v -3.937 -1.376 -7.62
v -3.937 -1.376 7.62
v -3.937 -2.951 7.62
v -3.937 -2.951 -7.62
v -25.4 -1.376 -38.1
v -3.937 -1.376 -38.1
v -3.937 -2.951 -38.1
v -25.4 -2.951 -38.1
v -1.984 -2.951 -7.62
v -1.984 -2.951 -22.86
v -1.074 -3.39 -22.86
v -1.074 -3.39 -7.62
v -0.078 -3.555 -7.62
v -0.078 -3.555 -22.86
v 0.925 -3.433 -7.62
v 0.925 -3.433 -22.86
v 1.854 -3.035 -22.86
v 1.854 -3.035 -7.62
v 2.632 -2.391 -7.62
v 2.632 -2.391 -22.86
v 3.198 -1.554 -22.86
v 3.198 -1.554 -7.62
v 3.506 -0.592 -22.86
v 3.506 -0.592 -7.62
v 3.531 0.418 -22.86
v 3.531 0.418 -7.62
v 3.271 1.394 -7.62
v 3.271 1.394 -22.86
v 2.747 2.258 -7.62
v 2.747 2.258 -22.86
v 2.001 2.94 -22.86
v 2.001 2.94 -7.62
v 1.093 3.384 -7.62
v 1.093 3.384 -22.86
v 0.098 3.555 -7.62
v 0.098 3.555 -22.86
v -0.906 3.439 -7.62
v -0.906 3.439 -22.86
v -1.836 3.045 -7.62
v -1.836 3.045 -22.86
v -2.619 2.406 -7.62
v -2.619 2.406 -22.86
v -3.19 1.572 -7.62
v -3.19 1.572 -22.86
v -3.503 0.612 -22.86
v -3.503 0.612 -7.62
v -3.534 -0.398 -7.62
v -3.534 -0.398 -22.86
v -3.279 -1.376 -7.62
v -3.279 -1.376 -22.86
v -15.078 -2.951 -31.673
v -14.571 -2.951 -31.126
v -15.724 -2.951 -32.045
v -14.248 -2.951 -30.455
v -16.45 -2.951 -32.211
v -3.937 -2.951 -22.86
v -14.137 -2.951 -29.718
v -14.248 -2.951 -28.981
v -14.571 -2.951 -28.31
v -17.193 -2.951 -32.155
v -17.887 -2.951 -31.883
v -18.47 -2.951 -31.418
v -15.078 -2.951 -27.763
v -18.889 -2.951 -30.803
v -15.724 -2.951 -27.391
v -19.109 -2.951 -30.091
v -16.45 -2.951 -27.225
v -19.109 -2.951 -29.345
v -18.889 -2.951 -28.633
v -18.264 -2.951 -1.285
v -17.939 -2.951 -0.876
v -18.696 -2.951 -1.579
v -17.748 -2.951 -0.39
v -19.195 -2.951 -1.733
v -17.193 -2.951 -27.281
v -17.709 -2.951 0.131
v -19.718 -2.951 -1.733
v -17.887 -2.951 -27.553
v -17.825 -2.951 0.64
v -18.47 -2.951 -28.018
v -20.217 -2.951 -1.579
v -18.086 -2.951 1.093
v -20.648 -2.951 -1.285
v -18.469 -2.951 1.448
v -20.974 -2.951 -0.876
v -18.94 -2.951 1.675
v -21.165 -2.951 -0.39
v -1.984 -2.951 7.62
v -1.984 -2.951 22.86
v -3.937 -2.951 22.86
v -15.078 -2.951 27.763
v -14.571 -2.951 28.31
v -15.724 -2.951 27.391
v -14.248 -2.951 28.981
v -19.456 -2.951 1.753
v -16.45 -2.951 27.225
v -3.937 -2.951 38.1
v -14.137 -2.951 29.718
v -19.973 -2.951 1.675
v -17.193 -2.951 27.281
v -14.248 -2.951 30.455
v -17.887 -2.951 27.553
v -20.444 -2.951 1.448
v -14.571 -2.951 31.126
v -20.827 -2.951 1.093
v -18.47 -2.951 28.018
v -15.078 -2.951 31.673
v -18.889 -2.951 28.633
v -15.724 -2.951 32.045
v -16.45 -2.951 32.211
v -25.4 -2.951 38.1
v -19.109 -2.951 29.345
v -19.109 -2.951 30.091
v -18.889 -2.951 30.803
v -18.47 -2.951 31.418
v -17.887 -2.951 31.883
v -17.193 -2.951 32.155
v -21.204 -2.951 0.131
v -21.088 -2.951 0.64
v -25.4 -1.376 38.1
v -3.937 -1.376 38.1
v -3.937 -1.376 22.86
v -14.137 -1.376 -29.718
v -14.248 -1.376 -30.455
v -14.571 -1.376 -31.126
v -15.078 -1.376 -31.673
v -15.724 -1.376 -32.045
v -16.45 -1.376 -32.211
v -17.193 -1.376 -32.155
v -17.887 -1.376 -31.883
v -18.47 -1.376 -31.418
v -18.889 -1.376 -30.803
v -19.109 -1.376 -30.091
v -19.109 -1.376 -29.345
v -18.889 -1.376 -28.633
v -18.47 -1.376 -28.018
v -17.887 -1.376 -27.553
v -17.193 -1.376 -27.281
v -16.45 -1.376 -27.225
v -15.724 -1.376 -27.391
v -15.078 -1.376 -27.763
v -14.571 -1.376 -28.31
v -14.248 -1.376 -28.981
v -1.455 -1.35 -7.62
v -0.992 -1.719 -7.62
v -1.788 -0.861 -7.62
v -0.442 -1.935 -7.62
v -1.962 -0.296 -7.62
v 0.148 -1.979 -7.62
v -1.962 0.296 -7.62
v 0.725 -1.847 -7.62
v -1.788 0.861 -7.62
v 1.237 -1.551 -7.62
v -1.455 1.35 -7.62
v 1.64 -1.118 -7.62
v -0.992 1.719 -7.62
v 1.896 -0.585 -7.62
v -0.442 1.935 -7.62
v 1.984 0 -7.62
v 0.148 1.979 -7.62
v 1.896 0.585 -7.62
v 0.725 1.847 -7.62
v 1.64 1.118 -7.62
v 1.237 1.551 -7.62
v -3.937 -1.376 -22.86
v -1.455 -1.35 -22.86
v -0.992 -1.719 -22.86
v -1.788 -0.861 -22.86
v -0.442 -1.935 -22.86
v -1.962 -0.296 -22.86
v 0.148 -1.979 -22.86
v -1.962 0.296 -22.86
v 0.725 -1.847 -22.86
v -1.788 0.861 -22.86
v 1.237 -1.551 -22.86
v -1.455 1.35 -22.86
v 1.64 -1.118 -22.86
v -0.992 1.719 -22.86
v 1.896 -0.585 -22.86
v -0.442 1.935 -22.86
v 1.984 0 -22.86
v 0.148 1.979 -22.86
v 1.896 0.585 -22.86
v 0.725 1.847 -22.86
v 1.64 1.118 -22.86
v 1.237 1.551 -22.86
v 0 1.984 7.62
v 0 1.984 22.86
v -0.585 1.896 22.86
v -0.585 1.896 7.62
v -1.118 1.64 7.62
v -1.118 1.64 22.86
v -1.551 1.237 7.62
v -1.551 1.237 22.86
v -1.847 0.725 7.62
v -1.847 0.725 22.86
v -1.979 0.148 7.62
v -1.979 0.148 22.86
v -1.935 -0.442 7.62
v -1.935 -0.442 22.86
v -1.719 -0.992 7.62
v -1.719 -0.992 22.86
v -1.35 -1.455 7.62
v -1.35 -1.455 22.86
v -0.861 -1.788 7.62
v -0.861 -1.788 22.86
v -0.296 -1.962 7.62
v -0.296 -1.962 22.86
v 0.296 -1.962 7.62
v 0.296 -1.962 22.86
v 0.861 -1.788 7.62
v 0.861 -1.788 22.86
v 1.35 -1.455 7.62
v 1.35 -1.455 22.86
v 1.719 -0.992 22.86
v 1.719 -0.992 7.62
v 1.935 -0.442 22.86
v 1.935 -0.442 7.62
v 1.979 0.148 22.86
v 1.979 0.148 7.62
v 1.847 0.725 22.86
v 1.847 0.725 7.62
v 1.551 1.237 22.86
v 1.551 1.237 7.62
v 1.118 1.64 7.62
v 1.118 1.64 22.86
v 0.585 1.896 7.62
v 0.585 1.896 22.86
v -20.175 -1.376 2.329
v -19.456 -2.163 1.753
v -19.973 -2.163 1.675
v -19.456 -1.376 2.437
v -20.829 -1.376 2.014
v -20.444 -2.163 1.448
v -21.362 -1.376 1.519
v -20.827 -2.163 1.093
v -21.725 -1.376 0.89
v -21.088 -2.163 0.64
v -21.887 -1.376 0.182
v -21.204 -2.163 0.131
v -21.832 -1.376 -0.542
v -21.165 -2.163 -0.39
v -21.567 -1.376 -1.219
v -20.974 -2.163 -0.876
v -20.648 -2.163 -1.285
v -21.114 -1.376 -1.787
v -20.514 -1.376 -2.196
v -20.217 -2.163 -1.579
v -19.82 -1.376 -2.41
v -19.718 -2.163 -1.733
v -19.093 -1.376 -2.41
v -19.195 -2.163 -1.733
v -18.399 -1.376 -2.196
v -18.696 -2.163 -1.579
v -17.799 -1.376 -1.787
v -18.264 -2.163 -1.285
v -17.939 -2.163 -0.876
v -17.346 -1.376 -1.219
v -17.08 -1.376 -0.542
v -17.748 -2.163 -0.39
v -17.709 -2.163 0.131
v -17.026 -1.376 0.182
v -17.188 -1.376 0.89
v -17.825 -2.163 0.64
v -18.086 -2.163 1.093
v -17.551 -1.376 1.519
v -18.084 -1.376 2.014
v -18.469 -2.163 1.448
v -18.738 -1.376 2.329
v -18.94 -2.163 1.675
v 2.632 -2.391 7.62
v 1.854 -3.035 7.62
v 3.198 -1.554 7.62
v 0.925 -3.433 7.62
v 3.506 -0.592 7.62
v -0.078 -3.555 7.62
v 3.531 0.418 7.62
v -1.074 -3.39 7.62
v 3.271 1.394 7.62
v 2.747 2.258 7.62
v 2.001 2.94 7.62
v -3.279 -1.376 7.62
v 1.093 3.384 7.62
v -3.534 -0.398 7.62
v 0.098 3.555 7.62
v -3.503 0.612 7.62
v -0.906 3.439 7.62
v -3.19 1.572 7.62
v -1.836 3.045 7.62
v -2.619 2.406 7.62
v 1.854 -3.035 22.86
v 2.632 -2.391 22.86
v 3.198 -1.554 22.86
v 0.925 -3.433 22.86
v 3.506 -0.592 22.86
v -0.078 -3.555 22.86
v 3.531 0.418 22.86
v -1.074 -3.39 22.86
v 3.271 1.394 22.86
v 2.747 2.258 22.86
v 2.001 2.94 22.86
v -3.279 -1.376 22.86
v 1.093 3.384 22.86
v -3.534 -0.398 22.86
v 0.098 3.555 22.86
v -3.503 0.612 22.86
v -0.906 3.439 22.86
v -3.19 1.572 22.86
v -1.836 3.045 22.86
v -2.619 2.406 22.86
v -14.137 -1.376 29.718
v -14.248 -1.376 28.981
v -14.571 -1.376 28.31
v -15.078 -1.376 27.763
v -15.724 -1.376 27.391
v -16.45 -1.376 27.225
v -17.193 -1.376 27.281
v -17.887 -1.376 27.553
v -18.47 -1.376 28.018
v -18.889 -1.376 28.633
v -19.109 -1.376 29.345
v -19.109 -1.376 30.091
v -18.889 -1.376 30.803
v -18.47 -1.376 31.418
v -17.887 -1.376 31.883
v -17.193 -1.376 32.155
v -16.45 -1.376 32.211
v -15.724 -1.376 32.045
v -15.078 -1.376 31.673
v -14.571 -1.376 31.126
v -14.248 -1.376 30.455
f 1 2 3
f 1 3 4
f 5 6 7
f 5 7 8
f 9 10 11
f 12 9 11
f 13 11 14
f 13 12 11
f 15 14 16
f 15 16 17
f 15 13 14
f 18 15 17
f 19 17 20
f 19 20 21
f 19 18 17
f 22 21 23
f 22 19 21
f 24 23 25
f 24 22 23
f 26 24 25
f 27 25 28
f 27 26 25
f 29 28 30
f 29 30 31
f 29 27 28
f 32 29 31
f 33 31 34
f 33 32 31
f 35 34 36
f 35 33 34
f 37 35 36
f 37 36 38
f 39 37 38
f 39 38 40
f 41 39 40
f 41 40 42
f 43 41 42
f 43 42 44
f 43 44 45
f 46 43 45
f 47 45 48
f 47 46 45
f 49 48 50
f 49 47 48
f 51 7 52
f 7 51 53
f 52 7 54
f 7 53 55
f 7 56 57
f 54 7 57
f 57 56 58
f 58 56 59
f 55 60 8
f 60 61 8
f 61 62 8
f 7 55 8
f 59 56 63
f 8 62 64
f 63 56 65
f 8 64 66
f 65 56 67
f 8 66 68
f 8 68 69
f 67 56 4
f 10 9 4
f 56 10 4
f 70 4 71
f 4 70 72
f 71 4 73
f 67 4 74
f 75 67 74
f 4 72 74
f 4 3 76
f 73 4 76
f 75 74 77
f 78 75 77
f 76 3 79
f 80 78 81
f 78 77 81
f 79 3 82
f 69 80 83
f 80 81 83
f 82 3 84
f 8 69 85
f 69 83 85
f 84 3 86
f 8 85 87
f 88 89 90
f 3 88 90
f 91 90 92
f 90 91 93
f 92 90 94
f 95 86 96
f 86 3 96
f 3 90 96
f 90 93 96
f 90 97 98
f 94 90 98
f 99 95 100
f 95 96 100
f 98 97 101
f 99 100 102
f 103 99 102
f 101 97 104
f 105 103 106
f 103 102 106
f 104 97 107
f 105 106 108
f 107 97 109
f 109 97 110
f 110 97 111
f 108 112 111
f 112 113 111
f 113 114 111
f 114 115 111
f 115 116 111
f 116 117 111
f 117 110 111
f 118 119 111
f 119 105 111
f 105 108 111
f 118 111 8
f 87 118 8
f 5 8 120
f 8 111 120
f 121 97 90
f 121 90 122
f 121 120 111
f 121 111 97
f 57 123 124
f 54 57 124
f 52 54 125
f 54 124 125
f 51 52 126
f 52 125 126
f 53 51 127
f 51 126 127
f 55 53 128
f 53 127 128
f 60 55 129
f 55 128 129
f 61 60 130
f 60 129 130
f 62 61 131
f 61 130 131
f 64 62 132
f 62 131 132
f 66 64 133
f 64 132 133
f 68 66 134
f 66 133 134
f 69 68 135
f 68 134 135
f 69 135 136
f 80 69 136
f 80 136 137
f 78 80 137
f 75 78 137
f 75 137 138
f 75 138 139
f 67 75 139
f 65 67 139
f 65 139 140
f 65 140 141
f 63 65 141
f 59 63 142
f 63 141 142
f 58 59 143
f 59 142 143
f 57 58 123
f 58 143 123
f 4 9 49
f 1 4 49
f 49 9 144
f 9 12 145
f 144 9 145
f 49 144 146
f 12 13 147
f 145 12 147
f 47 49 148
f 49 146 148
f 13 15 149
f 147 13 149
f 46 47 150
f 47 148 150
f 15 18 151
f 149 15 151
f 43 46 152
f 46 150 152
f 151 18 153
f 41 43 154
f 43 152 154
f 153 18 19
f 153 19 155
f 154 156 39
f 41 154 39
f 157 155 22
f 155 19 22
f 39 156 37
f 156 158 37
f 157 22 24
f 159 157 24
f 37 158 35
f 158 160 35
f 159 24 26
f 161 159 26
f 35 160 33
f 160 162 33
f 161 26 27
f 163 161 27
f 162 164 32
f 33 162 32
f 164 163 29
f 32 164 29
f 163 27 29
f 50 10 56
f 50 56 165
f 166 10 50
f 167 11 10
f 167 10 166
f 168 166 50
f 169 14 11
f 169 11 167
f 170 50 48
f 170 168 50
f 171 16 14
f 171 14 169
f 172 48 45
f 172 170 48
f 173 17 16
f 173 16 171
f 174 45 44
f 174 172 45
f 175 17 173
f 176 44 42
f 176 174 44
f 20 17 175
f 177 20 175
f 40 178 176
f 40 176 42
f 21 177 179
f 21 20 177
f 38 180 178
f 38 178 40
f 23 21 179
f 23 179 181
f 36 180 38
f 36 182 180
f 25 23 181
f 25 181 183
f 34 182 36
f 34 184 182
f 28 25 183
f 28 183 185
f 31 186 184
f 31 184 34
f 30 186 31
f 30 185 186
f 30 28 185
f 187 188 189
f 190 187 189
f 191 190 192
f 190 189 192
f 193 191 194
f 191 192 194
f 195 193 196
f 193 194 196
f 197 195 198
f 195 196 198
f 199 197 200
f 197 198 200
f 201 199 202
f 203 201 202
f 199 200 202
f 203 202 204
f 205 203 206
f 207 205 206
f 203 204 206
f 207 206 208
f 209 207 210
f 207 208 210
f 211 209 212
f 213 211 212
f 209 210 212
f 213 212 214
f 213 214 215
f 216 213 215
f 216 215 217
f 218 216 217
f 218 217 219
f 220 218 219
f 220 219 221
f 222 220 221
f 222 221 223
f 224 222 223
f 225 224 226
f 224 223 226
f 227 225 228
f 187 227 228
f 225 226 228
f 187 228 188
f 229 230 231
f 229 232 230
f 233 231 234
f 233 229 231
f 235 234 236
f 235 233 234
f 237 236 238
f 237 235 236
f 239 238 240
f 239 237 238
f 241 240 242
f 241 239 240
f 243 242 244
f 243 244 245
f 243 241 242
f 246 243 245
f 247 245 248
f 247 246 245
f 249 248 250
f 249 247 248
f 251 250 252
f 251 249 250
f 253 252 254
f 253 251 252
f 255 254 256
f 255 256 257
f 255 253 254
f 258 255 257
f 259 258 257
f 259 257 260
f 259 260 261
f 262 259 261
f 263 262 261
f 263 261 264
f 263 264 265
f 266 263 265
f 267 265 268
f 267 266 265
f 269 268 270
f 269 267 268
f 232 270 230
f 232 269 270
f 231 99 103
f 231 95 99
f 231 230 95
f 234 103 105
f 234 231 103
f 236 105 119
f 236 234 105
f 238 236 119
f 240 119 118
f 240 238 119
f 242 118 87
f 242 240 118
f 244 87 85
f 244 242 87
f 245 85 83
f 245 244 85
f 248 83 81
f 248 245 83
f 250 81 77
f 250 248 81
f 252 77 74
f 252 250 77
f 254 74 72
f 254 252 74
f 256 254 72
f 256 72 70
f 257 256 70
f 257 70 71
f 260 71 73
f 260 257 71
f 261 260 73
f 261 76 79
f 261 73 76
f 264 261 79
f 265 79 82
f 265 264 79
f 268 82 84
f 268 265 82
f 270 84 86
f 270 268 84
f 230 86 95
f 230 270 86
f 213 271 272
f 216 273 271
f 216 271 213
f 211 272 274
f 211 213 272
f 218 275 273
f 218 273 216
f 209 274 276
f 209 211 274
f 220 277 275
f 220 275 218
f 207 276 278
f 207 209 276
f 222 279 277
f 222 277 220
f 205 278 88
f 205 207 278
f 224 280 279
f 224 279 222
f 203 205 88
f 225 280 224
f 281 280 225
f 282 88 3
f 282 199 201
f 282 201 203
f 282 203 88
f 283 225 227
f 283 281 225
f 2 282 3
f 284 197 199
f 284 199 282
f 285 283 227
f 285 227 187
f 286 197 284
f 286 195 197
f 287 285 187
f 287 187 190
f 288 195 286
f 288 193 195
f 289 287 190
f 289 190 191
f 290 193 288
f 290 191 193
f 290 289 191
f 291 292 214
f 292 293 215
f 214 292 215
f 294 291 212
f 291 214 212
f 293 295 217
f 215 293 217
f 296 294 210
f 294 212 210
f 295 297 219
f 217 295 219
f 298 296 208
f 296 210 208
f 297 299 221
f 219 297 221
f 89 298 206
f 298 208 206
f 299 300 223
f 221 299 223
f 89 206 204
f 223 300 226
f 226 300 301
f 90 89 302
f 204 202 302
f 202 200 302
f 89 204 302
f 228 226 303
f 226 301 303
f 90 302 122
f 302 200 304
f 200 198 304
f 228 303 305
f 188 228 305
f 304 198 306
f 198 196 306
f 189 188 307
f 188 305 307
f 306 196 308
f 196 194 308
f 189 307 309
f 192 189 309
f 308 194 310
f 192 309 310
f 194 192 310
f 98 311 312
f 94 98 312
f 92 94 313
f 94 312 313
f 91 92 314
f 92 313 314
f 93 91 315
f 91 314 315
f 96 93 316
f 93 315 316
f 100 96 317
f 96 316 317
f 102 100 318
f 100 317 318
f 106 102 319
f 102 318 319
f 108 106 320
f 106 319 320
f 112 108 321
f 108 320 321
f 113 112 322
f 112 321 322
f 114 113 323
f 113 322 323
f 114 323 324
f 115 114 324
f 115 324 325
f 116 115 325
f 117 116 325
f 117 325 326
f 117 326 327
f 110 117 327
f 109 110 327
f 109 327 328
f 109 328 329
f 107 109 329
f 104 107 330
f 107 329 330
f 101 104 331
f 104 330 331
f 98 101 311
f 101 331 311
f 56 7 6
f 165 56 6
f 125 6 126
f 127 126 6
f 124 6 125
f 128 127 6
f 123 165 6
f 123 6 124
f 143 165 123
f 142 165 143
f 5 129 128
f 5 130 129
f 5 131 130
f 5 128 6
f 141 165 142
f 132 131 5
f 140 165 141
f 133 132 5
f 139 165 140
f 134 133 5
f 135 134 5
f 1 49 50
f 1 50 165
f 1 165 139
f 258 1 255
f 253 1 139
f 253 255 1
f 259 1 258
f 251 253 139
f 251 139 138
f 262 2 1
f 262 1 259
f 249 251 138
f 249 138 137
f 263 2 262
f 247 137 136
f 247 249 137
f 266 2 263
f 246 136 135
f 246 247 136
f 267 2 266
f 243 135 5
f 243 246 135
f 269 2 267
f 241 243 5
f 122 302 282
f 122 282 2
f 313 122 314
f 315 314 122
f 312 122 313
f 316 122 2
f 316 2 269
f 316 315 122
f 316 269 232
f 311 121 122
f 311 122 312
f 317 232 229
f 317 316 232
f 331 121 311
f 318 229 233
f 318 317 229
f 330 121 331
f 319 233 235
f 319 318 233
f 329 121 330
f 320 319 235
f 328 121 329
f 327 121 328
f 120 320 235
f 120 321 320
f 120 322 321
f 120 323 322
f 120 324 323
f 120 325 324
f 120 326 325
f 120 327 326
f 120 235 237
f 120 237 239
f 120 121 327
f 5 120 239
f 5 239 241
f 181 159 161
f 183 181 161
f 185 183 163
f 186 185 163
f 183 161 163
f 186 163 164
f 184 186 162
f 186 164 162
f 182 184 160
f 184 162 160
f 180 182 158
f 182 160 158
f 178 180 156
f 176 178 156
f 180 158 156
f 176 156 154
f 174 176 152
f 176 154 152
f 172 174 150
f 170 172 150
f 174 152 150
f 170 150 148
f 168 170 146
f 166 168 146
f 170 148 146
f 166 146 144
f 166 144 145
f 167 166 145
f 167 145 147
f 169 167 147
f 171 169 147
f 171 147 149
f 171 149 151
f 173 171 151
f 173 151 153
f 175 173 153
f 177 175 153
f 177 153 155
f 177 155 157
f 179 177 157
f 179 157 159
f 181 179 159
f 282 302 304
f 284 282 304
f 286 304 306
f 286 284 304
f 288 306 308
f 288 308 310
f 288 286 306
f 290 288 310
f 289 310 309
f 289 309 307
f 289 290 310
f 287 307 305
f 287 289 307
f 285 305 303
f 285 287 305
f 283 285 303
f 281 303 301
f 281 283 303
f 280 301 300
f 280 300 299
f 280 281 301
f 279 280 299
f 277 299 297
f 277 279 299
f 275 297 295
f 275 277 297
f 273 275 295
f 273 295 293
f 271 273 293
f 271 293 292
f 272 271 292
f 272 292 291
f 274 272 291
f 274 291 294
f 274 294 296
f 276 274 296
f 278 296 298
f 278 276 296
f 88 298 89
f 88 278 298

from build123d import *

# Parameters (mm, degrees)
BOSS_EXTRUDE1_DEPTH                            = 15.24
SKETCH2_W                                      = 15.24
SKETCH2_H                                      = 1.5748
BOSS_EXTRUDE2_DEPTH                            = 0.254646985
SKETCH3_W                                      = 30.48
SKETCH3_H                                      = 1.5748
BOSS_EXTRUDE3_DEPTH                            = 21.866377542
SKETCH4_W                                      = 15.24
SKETCH4_H                                      = 1.5748
CUT_EXTRUDE1_DEPTH                             = 0.403377542
BOSS_EXTRUDE4_DEPTH                            = 15.24
SKETCH6_W                                      = 21.463
SKETCH6_H                                      = 1.5748
BOSS_EXTRUDE5_DEPTH                            = 15.24
SKETCH7_W                                      = 21.463
SKETCH7_H                                      = 1.5748
BOSS_EXTRUDE6_DEPTH                            = 15.24
SKETCH8_W                                      = 1.984375
SKETCH8_H                                      = 30.480025
M3_5_CLEARANCE_HOLE2_D                         = 3.96875
M3_5_CLEARANCE_HOLE2_DEPTH                     = 60.960025
CSK_FOR_M3_FLAT_HEAD_MACHINE_SCREW1_AT_2_COUNT = 2
CSK_FOR_M3_FLAT_HEAD_MACHINE_SCREW1_AT_2_PITCH = 59.436
CSK_FOR_M3_FLAT_HEAD_MACHINE_SCREW1_AT_3_COUNT = 2
CSK_FOR_M3_FLAT_HEAD_MACHINE_SCREW1_AT_3_PITCH = 29.851441177
SKETCH14_R                                     = 2.5
CUT_EXTRUDE2_DEPTH                             = 1.5748


with BuildPart() as part:
    # Sketch1 → Boss-Extrude1 (new body)
    with BuildSketch(Plane.XY.offset(-7.62)):
        with BuildLine():
            Line((-3.278975474, -1.376029012), (-3.278975474, -2.950829012))
            Line((-3.278975474, -2.950829012), (-1.984375, -2.950829012))
            ThreePointArc((-1.984375, -2.950829012), (2.746946179, 2.258190135), (-3.278975474, -1.376029012))
        make_face()
    extrude(amount=-BOSS_EXTRUDE1_DEPTH)

    # Sketch2 → Boss-Extrude2 (add)
    with BuildSketch(Plane.ZY.offset(3.278975474)):
        with Locations((-15.24, -2.163429012)):
            Rectangle(SKETCH2_W, SKETCH2_H)
    extrude(amount=BOSS_EXTRUDE2_DEPTH)

    # Sketch3 → Boss-Extrude3 (add)
    with BuildSketch(Plane.ZY.offset(3.533622458)):
        with Locations((-7.62, -2.163429012)):
            Rectangle(SKETCH3_W, SKETCH3_H)
    extrude(amount=BOSS_EXTRUDE3_DEPTH)

    # Sketch4 → Cut-Extrude1 (cut)
    with BuildSketch(Plane(origin=(-3.533622458, 0, 0), x_dir=(0, 0, -1), z_dir=(1, 0, 0))):
        with Locations((0, -2.163429012)):
            Rectangle(SKETCH4_W, SKETCH4_H)
    extrude(amount=-CUT_EXTRUDE1_DEPTH, mode=Mode.SUBTRACT)

    # Sketch5 → Boss-Extrude4 (add)
    with BuildSketch(Plane.XY.offset(7.62)):
        with BuildLine():
            Line((-25.4, -1.376029012), (-3.278975474, -1.376029012))
            ThreePointArc((-3.278975474, -1.376029012), (2.746946179, 2.258190135), (-1.984375, -2.950829012))
            Line((-1.984375, -2.950829012), (-25.4, -2.950829012))
            Line((-25.4, -2.950829012), (-25.4, -1.376029012))
        make_face()
    extrude(amount=BOSS_EXTRUDE4_DEPTH)

    # Sketch6 → Boss-Extrude5 (add)
    with BuildSketch(Plane.XY.offset(22.86)):
        with Locations((-14.6685, -2.163429012)):
            Rectangle(SKETCH6_W, SKETCH6_H)
    extrude(amount=BOSS_EXTRUDE5_DEPTH)

    # Sketch7 → Boss-Extrude6 (add)
    with BuildSketch(Plane(origin=(0, 0, -22.86), x_dir=(-1, 0, 0), z_dir=(0, 0, -1))):
        with Locations((14.6685, -2.163429012)):
            Rectangle(SKETCH7_W, SKETCH7_H)
    extrude(amount=BOSS_EXTRUDE6_DEPTH)

    # Sketch8 → M3.5 Clearance Hole1 (revolve, cut)
    with BuildSketch(Plane(origin=(0, 0, 7.62), x_dir=(0, 1, 0), z_dir=(1, 0, 0))):
        with Locations((0.9921875, 15.2400125)):
            Rectangle(SKETCH8_W, SKETCH8_H)
    revolve(axis=Axis((0, 0, 1.27), (0, 0, 1)), mode=Mode.SUBTRACT)

    # M3.5 Clearance Hole2
    with Locations(Plane(origin=(0, 0, -22.86), x_dir=(-1, 0, 0), z_dir=(0, 0, -1))):
        with Locations((0, 0)):
            Hole(M3_5_CLEARANCE_HOLE2_D / 2, depth=M3_5_CLEARANCE_HOLE2_DEPTH)

    # Sketch12 → CSK for M3 Flat Head Machine Screw1 (revolve, cut)
    with BuildSketch(Plane(origin=(-16.637, -1.376029012, -29.718), x_dir=(0, 0, 1), z_dir=(1, 0, 0))):
        Polygon((0, 0), (0, 2.179970988), (1.7526, 2.179970988), (1.7526, 0.7874), (2.437076377, 0), align=None)
    csk_for_m3_flat_head_machine_screw1 = revolve(axis=Axis((-16.637, 4.973970988, -29.718), (0, -1, 0)), mode=Mode.SUBTRACT)

    # CSK for M3 Flat Head Machine Screw1 at 2: CSK for M3 Flat Head Machine Screw1 ×2
    with Locations(*[(0, 0, i * CSK_FOR_M3_FLAT_HEAD_MACHINE_SCREW1_AT_2_PITCH) for i in range(1, CSK_FOR_M3_FLAT_HEAD_MACHINE_SCREW1_AT_2_COUNT)]):
        add(csk_for_m3_flat_head_machine_screw1, mode=Mode.SUBTRACT)

    # CSK for M3 Flat Head Machine Screw1 at 3: CSK for M3 Flat Head Machine Screw1 ×2
    with Locations(*[Vector(-0.094447701, 0, 0.995529825) * (i * CSK_FOR_M3_FLAT_HEAD_MACHINE_SCREW1_AT_3_PITCH) for i in range(1, CSK_FOR_M3_FLAT_HEAD_MACHINE_SCREW1_AT_3_COUNT)]):
        add(csk_for_m3_flat_head_machine_screw1, mode=Mode.SUBTRACT)

    # Sketch14 → Cut-Extrude2 (cut)
    with BuildSketch(Plane(origin=(0, -1.376029012, 0), x_dir=(1, 0, 0), z_dir=(0, 1, 0))):
        with Locations((-16.637, 29.718)):
            Circle(SKETCH14_R)
        with Locations((-16.637, -29.718)):
            Circle(SKETCH14_R)
    extrude(amount=-CUT_EXTRUDE2_DEPTH, mode=Mode.SUBTRACT)


solid = part.part
